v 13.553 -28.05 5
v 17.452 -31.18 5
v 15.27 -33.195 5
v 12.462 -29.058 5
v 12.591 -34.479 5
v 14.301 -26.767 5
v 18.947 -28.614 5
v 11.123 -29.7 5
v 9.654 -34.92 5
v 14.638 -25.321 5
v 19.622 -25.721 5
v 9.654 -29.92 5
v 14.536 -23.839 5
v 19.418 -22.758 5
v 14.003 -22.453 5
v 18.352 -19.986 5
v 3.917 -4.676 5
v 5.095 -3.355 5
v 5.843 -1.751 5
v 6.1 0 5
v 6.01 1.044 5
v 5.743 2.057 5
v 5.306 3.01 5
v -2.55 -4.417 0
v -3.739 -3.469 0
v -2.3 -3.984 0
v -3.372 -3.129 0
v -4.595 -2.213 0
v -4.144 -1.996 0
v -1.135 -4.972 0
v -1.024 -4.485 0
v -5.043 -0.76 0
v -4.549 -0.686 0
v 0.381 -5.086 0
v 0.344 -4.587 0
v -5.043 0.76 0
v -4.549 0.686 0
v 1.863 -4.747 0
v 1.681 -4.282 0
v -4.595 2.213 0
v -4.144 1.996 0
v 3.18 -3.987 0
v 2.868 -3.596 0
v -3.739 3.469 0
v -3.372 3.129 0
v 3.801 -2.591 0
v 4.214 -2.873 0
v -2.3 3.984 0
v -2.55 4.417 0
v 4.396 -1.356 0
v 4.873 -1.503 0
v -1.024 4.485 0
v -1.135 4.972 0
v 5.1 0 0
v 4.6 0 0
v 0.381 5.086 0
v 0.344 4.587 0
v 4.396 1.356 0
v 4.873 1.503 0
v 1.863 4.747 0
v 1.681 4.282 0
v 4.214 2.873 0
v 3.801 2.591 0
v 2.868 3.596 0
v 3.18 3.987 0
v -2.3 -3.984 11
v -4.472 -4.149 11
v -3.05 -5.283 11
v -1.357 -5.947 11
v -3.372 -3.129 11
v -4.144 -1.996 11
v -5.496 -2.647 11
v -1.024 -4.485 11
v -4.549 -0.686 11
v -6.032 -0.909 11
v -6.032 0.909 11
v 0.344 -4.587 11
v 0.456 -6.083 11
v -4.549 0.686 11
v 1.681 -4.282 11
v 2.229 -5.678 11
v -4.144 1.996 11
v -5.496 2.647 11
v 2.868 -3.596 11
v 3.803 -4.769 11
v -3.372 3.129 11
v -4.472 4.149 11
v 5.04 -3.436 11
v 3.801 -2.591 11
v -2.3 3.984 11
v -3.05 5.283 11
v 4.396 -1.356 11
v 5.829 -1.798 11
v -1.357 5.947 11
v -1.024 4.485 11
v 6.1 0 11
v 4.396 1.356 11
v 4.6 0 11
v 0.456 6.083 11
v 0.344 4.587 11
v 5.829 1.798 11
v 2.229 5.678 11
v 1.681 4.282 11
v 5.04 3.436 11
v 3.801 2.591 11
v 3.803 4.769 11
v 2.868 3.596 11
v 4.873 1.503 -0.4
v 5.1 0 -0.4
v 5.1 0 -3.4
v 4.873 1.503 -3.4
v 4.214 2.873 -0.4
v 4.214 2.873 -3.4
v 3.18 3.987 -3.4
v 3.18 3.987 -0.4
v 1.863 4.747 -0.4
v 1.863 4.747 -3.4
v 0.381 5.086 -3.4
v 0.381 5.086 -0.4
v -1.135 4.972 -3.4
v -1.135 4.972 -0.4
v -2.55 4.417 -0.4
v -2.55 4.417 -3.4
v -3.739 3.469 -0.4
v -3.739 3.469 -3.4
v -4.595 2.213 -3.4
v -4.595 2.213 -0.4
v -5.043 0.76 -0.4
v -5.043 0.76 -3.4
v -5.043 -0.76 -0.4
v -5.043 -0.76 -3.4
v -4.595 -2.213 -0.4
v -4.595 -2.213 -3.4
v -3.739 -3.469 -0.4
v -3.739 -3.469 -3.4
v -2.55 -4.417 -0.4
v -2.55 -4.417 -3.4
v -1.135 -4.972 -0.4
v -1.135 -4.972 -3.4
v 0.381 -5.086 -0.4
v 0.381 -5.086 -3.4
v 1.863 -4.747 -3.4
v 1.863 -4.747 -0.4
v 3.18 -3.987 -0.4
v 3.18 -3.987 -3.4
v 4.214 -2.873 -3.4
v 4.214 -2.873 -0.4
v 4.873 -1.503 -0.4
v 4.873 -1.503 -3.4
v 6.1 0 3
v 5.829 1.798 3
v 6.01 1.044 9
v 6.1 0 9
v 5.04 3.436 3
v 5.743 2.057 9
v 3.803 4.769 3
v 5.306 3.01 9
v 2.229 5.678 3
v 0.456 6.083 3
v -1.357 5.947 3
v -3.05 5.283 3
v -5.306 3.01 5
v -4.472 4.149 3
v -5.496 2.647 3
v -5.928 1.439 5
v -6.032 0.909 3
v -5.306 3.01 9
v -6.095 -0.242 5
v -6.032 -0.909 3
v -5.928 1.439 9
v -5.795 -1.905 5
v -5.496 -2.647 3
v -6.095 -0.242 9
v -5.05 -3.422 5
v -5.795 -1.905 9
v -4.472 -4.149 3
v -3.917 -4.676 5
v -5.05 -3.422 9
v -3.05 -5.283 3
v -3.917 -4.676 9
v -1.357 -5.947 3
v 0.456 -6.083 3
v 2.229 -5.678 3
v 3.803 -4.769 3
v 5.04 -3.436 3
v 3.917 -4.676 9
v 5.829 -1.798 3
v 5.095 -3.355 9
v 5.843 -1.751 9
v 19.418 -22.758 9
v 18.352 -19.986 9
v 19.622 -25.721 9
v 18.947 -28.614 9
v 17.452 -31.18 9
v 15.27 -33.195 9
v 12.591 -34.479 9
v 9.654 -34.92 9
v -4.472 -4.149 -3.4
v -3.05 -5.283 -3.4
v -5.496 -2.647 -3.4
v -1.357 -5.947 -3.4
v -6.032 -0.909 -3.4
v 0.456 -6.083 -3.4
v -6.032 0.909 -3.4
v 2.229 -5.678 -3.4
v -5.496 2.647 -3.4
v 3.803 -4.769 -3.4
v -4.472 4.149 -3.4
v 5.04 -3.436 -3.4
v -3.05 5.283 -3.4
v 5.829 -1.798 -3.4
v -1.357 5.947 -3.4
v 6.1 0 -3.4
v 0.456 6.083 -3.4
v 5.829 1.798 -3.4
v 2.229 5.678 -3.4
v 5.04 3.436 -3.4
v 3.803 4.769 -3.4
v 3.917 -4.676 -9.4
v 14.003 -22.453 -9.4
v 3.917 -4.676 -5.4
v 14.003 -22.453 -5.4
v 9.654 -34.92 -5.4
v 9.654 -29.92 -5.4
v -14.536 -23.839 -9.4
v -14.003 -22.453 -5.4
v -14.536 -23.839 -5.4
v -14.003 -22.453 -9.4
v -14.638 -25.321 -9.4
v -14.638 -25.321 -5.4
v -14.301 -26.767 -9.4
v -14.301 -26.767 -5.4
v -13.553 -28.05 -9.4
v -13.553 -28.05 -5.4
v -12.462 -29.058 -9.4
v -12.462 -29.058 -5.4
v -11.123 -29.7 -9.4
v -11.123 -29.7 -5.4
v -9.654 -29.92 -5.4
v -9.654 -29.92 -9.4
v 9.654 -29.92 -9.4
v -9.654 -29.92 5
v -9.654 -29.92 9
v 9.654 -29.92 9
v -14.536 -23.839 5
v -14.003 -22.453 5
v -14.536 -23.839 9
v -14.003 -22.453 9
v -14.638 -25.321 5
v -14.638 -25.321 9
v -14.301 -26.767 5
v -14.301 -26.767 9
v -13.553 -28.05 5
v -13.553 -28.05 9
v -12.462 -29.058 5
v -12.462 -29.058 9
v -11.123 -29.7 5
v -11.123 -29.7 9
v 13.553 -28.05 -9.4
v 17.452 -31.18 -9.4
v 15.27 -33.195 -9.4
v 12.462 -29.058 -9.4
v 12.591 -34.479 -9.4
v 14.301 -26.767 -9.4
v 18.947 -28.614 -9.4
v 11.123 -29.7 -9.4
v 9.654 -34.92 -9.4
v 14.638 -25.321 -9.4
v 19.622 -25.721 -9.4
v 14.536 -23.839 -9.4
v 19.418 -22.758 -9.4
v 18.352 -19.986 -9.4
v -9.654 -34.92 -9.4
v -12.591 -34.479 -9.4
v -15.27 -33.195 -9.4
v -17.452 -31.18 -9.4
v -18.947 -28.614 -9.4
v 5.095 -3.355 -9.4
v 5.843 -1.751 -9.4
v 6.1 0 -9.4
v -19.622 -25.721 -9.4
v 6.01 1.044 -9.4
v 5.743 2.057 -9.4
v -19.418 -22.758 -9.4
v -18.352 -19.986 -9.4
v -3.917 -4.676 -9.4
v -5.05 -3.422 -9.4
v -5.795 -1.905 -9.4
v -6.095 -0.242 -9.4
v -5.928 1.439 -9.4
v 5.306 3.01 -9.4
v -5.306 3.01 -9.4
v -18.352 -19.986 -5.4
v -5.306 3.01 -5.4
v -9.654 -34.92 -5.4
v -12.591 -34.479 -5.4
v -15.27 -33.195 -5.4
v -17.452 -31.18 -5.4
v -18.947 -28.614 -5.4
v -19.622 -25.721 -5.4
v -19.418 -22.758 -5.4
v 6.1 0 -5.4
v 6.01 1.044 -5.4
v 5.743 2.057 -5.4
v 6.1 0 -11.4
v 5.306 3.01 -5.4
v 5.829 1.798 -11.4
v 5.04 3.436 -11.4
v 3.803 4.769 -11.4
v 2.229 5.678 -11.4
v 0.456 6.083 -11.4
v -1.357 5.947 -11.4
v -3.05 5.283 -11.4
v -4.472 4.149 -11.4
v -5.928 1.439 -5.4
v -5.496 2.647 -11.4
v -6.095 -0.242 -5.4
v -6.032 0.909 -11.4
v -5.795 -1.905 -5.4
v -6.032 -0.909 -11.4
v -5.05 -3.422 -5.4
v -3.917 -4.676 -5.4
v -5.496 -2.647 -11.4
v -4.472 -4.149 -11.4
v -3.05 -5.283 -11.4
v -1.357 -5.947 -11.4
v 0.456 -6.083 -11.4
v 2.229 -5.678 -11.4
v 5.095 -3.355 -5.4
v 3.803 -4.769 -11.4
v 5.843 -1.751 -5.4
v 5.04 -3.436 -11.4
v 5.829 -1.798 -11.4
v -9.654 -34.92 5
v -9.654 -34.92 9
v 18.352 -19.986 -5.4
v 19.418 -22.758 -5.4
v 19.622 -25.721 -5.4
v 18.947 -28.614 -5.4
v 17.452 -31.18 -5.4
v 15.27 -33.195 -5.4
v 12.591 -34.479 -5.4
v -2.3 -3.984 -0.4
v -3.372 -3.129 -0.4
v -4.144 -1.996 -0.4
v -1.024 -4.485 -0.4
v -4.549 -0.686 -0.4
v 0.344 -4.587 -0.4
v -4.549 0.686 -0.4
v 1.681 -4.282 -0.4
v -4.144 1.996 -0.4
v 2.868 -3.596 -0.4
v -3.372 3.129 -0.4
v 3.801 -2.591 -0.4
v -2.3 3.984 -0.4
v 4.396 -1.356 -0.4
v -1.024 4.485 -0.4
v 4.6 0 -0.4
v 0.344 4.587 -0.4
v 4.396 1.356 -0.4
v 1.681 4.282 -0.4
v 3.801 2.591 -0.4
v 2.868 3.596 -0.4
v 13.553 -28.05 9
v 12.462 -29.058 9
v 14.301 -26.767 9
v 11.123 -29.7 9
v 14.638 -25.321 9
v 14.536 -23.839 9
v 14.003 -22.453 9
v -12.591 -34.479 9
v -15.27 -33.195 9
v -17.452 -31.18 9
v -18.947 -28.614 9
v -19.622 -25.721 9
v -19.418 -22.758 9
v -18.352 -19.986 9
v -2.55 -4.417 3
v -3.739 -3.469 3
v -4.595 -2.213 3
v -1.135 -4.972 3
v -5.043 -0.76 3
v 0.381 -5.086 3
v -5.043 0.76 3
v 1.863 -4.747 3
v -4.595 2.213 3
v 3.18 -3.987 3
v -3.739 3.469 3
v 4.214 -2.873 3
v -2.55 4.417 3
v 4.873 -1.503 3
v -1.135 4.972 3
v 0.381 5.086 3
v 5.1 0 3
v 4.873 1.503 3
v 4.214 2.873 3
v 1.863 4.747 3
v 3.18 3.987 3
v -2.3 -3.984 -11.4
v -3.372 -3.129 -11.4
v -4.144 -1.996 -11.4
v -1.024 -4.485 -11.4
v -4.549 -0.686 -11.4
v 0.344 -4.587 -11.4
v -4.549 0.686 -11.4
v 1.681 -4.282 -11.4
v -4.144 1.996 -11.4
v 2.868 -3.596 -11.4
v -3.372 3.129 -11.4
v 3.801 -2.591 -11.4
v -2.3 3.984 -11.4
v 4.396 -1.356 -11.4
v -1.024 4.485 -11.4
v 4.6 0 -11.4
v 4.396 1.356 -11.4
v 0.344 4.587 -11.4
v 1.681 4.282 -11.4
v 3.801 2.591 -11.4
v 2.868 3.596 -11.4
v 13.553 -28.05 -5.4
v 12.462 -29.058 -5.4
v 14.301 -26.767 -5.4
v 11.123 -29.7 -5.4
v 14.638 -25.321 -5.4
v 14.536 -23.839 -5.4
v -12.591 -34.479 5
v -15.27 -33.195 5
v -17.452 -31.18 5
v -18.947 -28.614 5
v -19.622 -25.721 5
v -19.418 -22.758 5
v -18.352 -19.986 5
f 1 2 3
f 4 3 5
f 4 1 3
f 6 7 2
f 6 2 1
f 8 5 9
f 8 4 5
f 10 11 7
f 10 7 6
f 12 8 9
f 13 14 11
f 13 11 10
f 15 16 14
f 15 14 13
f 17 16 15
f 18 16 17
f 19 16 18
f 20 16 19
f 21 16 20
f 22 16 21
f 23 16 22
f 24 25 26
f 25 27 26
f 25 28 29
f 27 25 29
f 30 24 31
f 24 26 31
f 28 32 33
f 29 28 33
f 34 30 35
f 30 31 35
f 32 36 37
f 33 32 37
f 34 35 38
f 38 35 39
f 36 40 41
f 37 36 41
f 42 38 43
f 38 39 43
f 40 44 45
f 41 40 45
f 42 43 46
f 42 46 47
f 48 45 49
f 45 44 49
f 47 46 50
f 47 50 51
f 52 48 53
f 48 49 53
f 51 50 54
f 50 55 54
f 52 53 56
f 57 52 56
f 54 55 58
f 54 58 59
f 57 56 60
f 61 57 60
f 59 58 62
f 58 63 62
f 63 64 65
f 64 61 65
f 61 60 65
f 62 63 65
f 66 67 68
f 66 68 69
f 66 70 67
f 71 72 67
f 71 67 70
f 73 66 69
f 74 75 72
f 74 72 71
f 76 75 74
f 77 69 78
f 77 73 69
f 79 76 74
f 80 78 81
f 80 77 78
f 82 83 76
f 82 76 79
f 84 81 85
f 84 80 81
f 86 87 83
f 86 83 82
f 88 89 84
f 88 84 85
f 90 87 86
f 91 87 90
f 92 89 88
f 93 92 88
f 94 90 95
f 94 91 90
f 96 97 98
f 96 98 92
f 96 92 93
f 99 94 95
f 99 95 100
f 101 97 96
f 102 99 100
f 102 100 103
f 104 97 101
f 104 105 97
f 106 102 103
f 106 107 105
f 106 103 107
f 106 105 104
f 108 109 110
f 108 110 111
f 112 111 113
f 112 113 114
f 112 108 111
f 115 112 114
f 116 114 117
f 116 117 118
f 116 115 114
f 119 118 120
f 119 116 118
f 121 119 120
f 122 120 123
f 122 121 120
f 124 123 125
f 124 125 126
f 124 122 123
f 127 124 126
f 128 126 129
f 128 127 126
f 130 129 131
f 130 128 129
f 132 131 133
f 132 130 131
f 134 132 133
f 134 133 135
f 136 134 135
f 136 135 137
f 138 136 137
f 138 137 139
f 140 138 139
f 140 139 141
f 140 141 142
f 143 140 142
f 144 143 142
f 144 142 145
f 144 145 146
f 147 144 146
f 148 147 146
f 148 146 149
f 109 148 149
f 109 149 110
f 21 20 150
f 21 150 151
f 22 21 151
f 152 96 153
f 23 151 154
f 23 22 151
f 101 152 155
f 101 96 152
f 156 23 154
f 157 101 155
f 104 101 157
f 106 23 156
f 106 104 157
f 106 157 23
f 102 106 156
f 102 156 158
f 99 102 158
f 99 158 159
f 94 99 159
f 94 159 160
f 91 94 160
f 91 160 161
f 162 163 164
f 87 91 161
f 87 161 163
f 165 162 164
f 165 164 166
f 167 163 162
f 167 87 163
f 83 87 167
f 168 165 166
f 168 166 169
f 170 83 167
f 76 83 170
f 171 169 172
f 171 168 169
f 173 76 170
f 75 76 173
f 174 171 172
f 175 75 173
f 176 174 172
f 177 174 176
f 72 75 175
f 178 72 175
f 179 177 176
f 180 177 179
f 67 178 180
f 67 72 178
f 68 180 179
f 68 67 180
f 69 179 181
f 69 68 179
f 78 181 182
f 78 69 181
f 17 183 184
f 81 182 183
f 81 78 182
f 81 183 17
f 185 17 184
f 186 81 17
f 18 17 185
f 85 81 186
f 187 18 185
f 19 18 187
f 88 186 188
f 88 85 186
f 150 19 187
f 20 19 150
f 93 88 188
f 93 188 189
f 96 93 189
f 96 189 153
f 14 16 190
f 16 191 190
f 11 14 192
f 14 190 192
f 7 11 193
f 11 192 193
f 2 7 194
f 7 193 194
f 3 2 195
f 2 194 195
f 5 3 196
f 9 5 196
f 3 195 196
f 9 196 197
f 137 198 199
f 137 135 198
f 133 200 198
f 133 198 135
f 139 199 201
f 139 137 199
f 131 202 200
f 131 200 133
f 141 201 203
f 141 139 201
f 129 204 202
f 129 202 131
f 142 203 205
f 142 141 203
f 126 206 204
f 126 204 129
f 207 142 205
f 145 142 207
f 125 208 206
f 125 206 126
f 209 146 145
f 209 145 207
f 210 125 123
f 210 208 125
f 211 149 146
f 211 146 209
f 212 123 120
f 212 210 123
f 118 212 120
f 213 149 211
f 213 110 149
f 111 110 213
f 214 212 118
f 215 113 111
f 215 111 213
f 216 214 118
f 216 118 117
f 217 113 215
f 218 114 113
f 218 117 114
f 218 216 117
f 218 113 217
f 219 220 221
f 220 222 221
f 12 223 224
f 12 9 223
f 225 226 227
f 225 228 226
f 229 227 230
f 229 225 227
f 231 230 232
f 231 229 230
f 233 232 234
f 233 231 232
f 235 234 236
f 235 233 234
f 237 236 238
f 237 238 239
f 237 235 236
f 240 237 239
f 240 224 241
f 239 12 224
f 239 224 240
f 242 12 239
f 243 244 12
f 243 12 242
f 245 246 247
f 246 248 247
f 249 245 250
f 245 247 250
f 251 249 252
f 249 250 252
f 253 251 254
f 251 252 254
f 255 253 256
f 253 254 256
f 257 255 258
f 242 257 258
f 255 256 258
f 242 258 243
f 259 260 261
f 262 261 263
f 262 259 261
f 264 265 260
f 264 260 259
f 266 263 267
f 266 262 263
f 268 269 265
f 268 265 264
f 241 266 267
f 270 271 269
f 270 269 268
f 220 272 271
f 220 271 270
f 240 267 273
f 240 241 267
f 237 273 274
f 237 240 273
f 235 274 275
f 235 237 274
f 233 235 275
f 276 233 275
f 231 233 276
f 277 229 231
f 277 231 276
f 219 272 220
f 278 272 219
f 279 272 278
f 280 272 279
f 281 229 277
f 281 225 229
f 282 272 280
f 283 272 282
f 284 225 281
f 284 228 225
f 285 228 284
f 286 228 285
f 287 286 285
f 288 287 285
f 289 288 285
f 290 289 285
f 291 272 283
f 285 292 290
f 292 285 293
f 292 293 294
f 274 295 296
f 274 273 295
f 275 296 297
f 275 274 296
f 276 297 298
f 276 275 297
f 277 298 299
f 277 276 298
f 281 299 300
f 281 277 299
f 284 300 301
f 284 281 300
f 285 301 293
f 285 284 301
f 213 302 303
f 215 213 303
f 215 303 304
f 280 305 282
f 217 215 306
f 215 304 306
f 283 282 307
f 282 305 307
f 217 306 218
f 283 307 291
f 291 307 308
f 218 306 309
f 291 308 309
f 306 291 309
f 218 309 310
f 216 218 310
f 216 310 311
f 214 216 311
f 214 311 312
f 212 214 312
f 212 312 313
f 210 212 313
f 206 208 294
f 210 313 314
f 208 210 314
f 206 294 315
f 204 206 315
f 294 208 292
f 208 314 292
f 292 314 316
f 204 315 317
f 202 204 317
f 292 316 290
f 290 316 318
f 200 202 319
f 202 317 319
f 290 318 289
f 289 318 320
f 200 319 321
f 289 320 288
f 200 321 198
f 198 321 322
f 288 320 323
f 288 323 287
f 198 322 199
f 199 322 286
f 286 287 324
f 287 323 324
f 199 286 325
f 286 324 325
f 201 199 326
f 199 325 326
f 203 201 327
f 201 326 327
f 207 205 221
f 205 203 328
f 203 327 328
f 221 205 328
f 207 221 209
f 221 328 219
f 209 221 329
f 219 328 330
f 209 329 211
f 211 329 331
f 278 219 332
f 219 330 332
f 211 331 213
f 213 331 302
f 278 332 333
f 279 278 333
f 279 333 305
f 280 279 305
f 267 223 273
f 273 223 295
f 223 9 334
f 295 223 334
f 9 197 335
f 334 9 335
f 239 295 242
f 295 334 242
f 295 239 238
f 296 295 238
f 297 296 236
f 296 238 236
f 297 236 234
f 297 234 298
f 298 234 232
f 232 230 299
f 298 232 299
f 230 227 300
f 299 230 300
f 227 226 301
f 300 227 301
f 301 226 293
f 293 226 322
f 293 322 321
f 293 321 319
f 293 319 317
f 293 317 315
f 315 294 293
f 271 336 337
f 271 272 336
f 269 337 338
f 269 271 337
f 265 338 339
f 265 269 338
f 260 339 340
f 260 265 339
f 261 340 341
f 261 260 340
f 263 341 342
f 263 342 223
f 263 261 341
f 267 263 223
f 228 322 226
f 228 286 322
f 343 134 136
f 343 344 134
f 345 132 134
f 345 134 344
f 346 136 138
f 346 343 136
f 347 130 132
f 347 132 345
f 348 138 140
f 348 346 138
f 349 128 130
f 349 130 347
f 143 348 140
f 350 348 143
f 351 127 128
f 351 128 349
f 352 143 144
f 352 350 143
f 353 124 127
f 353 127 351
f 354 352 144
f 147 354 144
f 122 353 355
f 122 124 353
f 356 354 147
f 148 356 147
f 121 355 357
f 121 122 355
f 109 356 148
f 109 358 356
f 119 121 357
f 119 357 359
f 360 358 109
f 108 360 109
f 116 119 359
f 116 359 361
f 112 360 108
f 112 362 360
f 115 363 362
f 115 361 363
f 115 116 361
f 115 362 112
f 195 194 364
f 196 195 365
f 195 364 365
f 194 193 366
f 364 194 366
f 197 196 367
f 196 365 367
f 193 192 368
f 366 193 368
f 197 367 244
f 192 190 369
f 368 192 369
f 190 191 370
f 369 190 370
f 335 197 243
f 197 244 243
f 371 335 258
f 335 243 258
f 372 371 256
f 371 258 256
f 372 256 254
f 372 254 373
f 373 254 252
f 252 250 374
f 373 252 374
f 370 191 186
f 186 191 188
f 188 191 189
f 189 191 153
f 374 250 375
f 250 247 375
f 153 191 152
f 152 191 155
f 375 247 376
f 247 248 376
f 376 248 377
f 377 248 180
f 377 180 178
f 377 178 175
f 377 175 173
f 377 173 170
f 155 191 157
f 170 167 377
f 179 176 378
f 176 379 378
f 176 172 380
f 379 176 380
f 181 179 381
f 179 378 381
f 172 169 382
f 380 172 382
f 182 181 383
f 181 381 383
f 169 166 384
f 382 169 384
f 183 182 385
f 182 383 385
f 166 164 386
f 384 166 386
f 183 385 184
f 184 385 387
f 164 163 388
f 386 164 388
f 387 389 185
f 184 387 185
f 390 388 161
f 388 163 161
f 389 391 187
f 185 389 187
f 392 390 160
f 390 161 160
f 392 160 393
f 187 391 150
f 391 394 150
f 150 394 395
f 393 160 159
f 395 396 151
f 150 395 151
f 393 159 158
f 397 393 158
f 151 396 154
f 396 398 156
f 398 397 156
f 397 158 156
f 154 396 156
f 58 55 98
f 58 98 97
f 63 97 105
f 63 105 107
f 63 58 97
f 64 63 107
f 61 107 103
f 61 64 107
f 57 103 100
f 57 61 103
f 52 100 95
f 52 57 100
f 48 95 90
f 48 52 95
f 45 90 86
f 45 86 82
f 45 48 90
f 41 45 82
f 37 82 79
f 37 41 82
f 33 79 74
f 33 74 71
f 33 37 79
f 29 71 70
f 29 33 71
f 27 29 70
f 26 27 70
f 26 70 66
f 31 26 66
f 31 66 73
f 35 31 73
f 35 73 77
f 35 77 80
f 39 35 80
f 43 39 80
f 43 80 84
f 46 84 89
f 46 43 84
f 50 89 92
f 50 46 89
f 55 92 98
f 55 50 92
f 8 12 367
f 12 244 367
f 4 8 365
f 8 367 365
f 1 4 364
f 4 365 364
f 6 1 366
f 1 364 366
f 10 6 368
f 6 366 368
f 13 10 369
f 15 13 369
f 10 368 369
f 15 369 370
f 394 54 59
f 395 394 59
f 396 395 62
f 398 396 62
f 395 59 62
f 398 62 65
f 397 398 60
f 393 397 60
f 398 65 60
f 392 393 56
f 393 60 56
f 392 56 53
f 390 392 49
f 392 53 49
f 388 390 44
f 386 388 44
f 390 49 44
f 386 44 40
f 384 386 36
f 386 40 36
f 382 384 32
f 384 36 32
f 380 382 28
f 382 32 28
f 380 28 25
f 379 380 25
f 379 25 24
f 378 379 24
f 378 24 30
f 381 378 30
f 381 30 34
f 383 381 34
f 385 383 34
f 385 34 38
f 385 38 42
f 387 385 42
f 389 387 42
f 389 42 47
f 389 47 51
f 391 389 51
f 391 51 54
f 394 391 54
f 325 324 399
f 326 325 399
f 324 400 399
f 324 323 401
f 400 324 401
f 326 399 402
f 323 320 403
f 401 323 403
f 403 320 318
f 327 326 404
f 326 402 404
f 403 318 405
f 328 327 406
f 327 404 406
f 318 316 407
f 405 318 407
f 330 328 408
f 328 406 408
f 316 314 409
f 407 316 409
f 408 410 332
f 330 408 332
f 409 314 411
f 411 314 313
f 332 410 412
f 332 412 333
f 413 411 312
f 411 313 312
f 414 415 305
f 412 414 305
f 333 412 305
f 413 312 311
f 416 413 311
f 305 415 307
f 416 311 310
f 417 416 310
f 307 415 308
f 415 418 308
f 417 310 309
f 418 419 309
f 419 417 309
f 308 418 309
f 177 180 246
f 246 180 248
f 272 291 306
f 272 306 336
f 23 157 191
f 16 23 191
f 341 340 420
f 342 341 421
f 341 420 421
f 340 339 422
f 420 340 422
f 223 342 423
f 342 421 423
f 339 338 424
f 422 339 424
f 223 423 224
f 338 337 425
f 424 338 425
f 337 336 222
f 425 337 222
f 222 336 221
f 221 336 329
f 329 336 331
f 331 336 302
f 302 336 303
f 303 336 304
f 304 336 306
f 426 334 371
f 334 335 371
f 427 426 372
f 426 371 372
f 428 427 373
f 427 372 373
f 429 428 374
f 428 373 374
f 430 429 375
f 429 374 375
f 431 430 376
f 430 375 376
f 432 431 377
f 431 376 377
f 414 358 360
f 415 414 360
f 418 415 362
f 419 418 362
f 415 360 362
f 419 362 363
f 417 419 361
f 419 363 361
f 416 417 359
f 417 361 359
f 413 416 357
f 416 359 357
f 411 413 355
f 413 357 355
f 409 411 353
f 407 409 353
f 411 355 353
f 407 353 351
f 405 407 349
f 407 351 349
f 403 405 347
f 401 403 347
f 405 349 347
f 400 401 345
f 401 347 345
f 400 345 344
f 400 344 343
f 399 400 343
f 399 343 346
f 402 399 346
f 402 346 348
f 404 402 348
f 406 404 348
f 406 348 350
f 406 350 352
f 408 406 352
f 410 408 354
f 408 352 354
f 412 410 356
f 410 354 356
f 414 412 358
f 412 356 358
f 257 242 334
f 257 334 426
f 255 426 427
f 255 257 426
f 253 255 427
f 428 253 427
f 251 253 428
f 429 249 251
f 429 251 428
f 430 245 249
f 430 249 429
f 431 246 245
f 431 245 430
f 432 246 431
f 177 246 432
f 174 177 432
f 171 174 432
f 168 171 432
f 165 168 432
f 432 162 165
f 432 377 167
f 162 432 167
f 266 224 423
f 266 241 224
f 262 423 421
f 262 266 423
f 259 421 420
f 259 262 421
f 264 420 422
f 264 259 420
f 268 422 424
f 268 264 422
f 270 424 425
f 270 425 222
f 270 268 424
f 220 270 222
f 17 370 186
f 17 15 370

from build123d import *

# Parameters (mm, degrees)
SKETCH1_R                = 5.1
SKETCH1_R_2              = 4.6
EXTRUDE_THIN1_DEPTH      = 11
SKETCH2_R                = 6.1
SKETCH2_R_2              = 5.1
BOSS_EXTRUDE2_DEPTH      = 8
BOSS_EXTRUDE3_DEPTH      = 2
BOSS_EXTRUDE3_DEPTH_BACK = 2
SKETCH4_W                = 19.308386588
SKETCH4_H                = 5
BOSS_EXTRUDE4_DEPTH      = 5.2


with BuildPart() as part:
    # Sketch1 → Extrude-Thin1 (new body)
    with BuildSketch(Plane.XY):
        Circle(SKETCH1_R)
        Circle(SKETCH1_R_2, mode=Mode.SUBTRACT)
    extrude(amount=EXTRUDE_THIN1_DEPTH)

    # Sketch2 → Boss-Extrude2 (add)
    with BuildSketch(Plane.XY.offset(11)):
        Circle(SKETCH2_R)
        Circle(SKETCH2_R_2, mode=Mode.SUBTRACT)
    extrude(amount=-BOSS_EXTRUDE2_DEPTH)

    # Sketch3 → Boss-Extrude3 (add, two sides)
    with BuildSketch(Plane.XY.offset(7)) as boss_extrude3_sk:
        with BuildLine():
            Line((5.305614658, 3.010058653), (18.351922243, -19.9857327))
            ThreePointArc((18.351922243, -19.9857327), (18.2955249, -29.952887404), (9.654193294, -34.920255082))
            Line((9.654193294, -34.920255082), (-9.654193294, -34.920255082))
            ThreePointArc((-9.654193294, -34.920255082), (-18.2955249, -29.952887404), (-18.351922243, -19.9857327))
            Line((-18.351922243, -19.9857327), (-5.305614658, 3.010058653))
            ThreePointArc((-5.305614658, 3.010058653), (-6.002878674, -1.084180624), (-3.917463614, -4.675839907))
            Line((-3.917463614, -4.675839907), (-14.003057769, -22.452993891))
            ThreePointArc((-14.003057769, -22.452993891), (-13.974859097, -27.436571243), (-9.654193294, -29.920255082))
            Line((-9.654193294, -29.920255082), (9.654193294, -29.920255082))
            ThreePointArc((9.654193294, -29.920255082), (13.974859097, -27.436571243), (14.003057769, -22.452993891))
            Line((14.003057769, -22.452993891), (3.917463614, -4.675839907))
            ThreePointArc((3.917463614, -4.675839907), (6.002878674, -1.084180624), (5.305614658, 3.010058653))
        make_face()
    extrude(amount=BOSS_EXTRUDE3_DEPTH)
    extrude(boss_extrude3_sk.sketch, amount=-BOSS_EXTRUDE3_DEPTH_BACK)

    # Sketch4 → Boss-Extrude4 (add)
    with BuildSketch(Plane(origin=(0, 0, -0.2), x_dir=(-1, 0, 0), z_dir=(0, 0, -1))):
        with Locations((0, -32.420255082)):
            Rectangle(SKETCH4_W, SKETCH4_H)
    extrude(amount=-BOSS_EXTRUDE4_DEPTH)

    # Mirror3: part across plane


with BuildPart() as part_1:
    add(part.part)
    add(part.part.mirror(Plane(origin=(0, 0, -0.2), x_dir=(1, 0, 0), z_dir=(0, 0, -1))))


solid = part_1.part
